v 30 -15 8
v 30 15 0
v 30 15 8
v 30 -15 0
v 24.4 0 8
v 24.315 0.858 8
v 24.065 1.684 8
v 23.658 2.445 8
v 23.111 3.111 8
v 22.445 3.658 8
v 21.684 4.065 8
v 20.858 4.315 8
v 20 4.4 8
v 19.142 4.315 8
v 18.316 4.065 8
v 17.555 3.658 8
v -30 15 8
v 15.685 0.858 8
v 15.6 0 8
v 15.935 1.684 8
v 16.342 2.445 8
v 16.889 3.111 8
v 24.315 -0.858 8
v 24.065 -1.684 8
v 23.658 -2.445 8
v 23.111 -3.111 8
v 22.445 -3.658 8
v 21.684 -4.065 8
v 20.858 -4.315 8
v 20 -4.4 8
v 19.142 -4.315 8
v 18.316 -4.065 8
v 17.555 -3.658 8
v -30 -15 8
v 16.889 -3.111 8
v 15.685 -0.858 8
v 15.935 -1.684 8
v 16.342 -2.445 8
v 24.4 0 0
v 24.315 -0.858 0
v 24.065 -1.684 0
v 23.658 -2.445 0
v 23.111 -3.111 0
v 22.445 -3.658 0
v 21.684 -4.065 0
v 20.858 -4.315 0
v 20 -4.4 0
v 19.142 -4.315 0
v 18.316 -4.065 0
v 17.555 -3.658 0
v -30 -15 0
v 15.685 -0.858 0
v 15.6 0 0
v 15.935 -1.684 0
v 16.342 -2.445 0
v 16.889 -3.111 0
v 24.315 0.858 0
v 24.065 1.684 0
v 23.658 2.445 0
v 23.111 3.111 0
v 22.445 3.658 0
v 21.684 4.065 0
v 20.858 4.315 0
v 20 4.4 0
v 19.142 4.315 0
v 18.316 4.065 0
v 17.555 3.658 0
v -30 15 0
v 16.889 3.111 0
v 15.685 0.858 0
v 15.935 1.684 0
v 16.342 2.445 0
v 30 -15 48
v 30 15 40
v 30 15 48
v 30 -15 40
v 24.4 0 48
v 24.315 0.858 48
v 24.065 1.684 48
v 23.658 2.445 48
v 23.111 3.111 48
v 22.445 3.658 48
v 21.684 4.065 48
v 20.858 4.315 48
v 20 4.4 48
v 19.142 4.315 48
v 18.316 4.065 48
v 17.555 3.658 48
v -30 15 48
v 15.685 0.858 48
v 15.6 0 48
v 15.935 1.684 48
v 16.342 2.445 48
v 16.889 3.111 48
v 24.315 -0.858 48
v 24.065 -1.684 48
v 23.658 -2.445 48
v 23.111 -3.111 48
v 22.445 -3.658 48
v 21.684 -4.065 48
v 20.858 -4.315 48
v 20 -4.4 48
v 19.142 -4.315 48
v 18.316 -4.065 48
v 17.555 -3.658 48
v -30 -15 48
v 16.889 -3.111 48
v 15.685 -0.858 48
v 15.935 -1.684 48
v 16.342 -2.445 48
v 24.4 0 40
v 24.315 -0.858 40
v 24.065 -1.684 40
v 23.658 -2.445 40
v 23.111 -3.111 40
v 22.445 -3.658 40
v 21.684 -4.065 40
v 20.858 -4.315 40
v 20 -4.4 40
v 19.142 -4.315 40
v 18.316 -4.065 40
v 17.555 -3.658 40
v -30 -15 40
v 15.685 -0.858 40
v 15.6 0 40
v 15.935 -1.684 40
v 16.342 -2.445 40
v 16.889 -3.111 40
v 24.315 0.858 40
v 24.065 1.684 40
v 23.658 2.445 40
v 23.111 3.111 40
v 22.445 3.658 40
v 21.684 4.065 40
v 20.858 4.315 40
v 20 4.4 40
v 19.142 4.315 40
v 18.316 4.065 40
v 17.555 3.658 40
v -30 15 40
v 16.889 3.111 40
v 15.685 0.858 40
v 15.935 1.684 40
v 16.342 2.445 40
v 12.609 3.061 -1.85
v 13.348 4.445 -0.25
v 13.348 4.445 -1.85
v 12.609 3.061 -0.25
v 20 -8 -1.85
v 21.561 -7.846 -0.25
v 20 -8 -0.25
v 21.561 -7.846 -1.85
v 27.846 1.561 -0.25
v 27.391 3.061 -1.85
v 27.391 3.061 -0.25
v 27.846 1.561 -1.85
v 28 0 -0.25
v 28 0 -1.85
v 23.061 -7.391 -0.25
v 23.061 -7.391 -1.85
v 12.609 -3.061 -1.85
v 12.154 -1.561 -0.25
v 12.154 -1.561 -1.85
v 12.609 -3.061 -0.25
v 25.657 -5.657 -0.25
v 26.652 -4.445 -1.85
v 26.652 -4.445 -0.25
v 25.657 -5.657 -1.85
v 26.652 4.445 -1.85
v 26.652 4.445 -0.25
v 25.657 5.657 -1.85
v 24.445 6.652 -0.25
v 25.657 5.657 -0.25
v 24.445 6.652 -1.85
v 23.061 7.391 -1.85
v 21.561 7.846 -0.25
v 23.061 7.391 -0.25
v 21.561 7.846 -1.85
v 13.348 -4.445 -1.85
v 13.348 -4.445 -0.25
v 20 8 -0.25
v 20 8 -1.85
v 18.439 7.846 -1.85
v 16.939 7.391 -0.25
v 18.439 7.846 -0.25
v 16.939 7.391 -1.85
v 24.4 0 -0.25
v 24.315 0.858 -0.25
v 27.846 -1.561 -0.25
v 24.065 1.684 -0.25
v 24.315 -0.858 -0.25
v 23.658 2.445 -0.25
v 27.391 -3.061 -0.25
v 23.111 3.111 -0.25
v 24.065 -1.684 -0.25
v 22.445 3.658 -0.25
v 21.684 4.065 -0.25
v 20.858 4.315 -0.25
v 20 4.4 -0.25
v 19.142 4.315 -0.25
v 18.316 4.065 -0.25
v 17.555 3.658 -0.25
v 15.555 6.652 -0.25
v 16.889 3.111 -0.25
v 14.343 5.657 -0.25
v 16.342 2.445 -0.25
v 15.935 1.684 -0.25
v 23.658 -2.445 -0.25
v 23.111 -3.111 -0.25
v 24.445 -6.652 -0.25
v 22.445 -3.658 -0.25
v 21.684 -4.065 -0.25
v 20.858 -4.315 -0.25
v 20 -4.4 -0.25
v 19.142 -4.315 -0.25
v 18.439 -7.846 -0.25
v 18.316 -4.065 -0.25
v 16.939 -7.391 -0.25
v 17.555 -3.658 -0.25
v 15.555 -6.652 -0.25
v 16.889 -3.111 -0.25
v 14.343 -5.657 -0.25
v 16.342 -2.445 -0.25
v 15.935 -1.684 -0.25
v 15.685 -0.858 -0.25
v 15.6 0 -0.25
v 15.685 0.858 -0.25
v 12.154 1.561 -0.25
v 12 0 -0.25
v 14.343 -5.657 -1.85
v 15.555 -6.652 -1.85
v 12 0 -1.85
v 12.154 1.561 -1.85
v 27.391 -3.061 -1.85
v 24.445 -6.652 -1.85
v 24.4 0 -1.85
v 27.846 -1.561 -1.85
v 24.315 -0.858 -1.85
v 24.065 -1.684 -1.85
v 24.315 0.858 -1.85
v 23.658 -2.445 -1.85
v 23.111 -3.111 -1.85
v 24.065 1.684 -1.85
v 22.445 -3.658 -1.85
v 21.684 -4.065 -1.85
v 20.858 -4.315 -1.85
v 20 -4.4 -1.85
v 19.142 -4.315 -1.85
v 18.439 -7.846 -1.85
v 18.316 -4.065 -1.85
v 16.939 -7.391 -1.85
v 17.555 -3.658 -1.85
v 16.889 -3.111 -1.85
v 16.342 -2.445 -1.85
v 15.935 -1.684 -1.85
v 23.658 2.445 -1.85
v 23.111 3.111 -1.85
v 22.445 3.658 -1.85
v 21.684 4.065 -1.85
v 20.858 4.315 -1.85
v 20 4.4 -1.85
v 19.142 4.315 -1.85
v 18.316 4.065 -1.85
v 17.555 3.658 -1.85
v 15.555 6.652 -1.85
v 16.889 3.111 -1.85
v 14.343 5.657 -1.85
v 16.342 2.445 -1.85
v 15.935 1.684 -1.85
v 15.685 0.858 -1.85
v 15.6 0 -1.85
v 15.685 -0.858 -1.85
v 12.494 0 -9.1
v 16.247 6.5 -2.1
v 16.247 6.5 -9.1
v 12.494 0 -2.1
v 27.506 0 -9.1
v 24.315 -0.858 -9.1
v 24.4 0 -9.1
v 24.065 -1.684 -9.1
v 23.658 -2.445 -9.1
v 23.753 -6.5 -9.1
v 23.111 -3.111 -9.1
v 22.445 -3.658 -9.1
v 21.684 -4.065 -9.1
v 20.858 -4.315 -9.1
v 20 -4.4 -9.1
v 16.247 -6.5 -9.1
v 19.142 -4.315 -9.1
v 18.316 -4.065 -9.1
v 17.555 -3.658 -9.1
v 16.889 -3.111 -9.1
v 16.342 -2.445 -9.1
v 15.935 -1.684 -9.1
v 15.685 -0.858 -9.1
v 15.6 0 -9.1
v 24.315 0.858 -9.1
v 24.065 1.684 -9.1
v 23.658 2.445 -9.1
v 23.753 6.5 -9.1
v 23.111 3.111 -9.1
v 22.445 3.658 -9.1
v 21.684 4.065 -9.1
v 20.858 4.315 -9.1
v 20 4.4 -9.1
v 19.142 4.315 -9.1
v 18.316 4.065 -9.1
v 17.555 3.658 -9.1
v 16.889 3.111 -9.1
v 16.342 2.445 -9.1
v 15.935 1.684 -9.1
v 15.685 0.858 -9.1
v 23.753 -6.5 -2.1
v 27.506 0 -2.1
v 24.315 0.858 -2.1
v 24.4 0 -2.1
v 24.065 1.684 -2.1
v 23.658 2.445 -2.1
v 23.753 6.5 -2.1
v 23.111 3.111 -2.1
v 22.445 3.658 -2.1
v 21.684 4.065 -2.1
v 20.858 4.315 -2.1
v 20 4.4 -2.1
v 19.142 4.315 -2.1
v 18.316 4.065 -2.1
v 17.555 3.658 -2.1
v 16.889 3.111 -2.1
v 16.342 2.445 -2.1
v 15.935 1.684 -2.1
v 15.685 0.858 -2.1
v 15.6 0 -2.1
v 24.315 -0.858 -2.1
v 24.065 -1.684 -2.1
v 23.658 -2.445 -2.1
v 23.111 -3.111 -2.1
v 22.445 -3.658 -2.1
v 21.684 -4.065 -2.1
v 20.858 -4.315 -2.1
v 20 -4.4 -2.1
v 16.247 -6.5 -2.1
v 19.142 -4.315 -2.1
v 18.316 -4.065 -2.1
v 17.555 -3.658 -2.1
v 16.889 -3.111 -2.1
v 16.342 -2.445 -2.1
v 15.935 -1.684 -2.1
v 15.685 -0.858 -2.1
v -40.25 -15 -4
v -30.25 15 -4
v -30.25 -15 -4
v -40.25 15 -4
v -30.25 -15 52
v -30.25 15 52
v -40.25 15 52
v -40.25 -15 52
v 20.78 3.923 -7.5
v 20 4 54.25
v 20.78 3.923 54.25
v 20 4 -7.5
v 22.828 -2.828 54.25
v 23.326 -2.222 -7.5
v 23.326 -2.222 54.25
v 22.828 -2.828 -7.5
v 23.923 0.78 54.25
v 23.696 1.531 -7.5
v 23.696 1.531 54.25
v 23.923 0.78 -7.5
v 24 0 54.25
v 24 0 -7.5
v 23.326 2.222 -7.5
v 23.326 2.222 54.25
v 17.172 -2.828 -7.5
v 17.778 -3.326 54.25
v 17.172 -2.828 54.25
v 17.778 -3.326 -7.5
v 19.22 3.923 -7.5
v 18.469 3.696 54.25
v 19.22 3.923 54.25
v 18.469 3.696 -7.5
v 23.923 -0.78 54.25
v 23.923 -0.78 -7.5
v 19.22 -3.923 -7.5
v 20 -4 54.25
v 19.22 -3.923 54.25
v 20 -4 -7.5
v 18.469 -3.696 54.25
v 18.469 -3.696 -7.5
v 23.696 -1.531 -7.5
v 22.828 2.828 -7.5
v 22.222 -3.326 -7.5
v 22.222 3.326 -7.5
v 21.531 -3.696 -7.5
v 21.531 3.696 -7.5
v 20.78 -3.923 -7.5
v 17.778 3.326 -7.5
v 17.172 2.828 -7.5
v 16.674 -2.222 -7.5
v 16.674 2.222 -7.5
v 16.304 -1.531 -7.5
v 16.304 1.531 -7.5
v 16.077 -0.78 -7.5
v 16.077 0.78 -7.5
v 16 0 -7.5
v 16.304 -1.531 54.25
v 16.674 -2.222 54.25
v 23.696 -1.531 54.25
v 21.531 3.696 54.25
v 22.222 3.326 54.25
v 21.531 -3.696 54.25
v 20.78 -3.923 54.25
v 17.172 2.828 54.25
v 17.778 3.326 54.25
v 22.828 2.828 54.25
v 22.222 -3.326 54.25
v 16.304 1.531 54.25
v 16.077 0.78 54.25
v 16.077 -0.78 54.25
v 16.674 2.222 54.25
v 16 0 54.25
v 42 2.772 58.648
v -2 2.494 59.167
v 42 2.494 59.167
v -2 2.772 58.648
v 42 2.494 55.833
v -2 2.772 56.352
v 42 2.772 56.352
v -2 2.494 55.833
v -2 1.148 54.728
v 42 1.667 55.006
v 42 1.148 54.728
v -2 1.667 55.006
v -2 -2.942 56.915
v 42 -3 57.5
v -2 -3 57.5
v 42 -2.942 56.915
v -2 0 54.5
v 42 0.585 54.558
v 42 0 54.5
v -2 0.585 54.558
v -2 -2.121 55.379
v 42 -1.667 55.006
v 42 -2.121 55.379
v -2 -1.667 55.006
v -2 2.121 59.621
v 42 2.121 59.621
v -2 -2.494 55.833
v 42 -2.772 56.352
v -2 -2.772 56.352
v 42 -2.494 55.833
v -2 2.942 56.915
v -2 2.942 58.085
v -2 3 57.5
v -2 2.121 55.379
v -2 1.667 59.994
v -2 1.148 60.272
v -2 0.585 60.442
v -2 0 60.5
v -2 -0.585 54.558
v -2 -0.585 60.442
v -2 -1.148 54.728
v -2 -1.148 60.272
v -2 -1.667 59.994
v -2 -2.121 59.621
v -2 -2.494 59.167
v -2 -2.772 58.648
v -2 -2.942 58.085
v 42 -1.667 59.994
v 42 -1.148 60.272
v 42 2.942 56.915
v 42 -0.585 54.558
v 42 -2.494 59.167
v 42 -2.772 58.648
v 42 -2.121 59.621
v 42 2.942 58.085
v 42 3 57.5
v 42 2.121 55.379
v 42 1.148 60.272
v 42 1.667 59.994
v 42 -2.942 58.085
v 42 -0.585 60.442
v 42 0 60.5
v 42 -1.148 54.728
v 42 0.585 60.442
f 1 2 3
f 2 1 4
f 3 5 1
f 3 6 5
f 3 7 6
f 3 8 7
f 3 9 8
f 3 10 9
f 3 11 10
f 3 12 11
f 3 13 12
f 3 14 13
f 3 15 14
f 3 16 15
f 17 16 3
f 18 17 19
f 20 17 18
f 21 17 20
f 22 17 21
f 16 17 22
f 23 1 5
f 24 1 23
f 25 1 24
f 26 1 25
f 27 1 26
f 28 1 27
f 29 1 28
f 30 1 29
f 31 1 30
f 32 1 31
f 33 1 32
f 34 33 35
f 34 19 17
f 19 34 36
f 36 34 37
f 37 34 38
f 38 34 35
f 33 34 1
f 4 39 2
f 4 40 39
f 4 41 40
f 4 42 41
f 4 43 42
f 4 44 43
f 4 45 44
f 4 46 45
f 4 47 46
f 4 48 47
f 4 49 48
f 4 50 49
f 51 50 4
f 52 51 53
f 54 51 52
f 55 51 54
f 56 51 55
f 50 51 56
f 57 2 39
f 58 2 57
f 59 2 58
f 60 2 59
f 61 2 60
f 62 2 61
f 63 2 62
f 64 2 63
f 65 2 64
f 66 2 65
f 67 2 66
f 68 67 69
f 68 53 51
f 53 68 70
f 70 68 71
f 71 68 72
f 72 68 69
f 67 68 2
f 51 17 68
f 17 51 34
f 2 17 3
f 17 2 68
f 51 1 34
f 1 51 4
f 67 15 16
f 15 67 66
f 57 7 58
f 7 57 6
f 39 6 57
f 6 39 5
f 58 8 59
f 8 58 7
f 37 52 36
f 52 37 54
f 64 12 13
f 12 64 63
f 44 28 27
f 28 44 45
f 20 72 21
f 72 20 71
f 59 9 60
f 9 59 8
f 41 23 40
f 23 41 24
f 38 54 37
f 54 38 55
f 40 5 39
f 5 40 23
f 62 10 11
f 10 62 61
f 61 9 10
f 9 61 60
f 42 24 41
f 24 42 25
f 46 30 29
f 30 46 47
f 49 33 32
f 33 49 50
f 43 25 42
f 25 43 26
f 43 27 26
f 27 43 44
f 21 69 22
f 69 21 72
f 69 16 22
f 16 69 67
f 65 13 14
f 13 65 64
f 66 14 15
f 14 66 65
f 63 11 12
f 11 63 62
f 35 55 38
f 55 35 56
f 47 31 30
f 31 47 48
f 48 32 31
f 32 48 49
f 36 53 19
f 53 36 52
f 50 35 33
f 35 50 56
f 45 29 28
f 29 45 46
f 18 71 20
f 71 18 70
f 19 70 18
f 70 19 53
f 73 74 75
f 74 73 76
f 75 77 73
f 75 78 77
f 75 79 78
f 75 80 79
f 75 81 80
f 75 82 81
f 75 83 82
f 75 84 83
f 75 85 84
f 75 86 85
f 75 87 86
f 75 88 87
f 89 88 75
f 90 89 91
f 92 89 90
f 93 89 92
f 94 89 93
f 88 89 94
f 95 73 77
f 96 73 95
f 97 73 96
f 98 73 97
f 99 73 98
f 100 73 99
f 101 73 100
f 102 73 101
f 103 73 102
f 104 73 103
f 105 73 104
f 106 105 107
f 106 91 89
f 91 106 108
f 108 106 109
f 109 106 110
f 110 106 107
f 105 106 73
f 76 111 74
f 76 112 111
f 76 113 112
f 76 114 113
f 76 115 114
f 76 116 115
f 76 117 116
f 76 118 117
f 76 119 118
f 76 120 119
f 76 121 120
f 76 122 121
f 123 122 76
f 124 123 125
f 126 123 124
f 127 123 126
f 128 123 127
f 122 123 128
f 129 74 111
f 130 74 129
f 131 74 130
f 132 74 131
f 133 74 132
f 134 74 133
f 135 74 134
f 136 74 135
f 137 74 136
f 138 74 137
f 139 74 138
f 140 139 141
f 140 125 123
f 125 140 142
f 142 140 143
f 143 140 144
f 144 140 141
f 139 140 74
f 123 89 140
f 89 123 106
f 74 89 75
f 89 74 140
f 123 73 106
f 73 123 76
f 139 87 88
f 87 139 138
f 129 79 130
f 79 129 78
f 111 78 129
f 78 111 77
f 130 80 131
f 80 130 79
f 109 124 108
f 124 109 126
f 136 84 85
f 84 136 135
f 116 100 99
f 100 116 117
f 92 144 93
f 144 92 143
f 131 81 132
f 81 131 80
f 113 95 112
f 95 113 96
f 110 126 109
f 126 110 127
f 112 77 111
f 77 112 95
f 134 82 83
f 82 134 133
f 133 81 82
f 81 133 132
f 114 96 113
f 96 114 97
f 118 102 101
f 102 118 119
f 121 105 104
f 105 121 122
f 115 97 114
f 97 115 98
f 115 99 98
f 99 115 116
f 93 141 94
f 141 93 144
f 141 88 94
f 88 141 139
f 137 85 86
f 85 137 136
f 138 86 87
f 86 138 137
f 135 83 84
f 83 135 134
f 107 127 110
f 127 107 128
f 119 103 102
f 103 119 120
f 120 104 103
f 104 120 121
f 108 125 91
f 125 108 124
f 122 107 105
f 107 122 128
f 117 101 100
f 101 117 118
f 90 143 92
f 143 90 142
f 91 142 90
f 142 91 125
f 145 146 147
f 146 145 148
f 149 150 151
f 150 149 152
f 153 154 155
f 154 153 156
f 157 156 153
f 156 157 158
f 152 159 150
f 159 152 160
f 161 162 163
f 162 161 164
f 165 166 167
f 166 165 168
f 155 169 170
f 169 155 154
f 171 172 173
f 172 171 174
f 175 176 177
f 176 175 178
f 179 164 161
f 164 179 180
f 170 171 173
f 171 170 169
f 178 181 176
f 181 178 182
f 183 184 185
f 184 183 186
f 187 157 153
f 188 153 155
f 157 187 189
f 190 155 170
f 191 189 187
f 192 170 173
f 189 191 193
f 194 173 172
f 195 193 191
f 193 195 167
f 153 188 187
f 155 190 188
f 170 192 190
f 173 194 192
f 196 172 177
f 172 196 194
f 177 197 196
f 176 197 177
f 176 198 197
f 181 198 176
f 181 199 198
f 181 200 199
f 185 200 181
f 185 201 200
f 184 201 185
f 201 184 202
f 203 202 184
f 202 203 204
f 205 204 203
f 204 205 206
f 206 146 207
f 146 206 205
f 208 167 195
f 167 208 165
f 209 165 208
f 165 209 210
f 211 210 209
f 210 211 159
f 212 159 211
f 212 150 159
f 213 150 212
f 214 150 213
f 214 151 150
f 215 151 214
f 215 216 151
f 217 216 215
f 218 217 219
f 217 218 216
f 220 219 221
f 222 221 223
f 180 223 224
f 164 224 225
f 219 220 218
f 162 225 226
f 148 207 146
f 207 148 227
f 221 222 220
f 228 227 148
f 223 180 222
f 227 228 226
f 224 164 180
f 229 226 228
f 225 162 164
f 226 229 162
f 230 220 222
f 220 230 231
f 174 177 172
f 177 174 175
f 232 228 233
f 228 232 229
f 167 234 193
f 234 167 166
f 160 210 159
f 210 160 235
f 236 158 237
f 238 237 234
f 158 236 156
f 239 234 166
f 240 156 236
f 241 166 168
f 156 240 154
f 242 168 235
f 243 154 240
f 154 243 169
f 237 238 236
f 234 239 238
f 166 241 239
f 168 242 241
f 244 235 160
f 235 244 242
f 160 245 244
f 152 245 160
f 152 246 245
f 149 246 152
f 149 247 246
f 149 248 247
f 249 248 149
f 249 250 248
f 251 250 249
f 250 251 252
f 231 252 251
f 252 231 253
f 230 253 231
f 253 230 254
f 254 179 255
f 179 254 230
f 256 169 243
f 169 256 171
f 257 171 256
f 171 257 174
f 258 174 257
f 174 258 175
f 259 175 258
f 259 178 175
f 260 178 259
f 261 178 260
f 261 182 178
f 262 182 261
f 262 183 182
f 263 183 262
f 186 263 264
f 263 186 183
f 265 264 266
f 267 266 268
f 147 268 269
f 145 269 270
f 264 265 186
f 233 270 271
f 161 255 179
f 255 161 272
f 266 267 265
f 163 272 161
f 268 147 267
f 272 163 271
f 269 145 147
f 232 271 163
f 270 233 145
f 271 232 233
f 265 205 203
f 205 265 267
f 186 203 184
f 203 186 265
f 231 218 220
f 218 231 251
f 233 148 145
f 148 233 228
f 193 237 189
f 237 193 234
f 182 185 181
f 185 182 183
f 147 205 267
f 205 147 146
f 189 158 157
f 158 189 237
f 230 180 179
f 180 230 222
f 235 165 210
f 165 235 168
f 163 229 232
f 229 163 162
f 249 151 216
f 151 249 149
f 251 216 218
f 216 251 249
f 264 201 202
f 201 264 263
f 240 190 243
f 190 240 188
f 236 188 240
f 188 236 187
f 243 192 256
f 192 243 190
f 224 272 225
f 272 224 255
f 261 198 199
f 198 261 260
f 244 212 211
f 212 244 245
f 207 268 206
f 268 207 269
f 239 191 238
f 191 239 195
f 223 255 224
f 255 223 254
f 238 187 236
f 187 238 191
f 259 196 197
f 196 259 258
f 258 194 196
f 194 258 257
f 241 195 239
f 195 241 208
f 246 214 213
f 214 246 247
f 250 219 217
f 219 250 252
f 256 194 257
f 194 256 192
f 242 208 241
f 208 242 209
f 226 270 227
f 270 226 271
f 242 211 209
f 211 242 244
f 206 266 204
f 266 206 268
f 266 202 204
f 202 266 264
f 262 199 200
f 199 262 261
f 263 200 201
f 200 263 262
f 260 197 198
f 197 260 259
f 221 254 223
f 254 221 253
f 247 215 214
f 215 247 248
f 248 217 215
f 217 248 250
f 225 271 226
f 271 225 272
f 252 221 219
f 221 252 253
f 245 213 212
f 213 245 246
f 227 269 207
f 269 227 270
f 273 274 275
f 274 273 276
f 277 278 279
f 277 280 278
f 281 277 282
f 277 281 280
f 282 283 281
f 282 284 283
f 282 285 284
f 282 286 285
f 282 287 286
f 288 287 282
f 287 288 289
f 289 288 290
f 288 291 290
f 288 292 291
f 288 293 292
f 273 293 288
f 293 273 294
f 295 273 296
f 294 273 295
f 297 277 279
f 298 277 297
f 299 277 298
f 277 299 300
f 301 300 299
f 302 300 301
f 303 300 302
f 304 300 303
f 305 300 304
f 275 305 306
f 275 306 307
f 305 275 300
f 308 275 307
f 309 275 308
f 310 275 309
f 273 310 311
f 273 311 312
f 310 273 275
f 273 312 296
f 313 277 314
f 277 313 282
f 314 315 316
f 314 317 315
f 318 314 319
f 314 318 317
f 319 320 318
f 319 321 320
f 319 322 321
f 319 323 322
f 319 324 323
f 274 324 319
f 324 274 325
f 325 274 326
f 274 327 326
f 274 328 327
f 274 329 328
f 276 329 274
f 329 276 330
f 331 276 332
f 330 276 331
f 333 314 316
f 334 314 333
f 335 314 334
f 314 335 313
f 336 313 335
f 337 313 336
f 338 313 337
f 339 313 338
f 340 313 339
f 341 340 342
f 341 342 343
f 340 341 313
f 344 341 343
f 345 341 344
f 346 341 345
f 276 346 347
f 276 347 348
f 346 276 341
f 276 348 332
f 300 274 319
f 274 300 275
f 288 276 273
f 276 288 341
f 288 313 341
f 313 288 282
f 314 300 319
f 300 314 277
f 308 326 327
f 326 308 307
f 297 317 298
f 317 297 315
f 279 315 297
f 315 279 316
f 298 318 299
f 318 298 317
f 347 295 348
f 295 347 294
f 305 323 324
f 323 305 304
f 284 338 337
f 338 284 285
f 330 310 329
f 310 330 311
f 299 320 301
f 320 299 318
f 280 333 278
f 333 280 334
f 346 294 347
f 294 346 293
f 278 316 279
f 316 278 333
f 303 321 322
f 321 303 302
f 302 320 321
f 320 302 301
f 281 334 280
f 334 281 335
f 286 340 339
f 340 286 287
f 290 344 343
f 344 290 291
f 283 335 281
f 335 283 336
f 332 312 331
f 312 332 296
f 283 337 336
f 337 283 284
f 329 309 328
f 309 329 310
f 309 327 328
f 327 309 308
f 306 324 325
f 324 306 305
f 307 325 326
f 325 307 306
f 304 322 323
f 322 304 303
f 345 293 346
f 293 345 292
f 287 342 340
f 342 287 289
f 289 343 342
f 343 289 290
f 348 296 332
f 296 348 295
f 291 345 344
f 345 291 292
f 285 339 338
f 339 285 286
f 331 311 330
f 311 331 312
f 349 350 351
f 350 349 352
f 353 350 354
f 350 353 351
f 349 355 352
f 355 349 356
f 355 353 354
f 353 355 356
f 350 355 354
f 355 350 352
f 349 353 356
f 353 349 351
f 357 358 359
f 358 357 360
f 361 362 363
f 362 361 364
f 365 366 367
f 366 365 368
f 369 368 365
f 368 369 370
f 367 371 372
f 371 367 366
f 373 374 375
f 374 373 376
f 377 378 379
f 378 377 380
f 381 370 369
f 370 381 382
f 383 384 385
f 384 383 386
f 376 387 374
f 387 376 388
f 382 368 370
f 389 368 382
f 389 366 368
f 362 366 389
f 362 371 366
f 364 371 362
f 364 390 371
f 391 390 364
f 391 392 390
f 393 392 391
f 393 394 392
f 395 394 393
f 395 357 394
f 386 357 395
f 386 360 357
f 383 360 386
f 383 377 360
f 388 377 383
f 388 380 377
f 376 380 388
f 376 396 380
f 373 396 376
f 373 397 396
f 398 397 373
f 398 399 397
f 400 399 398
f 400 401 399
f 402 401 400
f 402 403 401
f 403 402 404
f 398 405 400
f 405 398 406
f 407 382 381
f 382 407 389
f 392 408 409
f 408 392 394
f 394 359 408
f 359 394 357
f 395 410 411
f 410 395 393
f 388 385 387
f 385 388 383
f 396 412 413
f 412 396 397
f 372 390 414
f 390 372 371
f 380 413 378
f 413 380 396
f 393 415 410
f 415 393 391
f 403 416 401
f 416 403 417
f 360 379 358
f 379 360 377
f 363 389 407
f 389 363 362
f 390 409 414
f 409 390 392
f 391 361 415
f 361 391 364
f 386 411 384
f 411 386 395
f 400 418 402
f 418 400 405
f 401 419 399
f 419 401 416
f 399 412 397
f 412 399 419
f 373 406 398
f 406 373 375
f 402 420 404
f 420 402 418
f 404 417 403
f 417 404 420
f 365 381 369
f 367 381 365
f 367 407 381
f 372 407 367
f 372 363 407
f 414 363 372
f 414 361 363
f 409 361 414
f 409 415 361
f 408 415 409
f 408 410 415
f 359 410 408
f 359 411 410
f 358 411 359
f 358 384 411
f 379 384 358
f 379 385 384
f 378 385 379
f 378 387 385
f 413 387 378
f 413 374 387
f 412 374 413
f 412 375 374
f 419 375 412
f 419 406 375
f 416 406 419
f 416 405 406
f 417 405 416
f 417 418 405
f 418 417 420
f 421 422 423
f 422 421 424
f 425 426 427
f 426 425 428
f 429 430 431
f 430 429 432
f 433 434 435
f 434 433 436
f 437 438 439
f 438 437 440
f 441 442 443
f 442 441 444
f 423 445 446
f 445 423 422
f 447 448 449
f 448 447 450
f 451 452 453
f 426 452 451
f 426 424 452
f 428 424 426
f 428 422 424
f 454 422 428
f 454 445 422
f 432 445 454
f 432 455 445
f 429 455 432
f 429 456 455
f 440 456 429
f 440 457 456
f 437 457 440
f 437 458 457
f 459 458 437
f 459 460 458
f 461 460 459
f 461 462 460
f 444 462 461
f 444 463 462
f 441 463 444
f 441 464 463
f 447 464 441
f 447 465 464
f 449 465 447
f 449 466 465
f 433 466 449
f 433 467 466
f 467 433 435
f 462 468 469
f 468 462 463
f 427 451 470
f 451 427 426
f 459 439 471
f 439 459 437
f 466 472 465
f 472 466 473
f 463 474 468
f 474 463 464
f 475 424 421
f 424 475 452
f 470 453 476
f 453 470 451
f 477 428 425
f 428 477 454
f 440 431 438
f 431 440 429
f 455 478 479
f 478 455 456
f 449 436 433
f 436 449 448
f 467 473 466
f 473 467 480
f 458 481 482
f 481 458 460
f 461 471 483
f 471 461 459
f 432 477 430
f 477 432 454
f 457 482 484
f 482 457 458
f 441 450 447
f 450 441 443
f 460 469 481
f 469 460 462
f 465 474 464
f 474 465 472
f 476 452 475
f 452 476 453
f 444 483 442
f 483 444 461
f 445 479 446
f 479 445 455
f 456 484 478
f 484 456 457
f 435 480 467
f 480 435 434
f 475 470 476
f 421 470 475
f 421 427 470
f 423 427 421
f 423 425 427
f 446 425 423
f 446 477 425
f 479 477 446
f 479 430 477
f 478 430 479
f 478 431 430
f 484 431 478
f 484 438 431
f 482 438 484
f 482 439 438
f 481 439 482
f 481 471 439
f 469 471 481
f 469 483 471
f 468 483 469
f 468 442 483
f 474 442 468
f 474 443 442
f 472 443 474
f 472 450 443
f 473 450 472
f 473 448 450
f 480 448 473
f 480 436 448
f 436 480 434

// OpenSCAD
$fn = 32;

// ------------------------------------------------------------------------
// C clamp: throat 40 mm, screw d8
// Every part is its own module, assembly() places every instance.
// ------------------------------------------------------------------------

// --- part 1 ---
module clamp_arm() {
  difference() {
    translate([-30, -15, 0]) cube([60, 30, 8]);
    translate([20, 0, -1]) cylinder(h = 10, d = 8.8);
  }
}

// --- part 2 ---
module clamp_spine() {
  difference() {
    translate([-28, -15, 0]) cube([56, 30, 10]);
  }
}

// --- part 3 ---
module clamp_screw() {
  translate([0, 0, -30.875]) cylinder(h = 61.75, d = 8);
}

// --- part 4 ---
module clamp_washer() {
  difference() {
      translate([0, 0, 0]) cylinder(h = 1.6, d = 16);
      translate([0, 0, -1]) cylinder(h = 3.6, d = 8.8);
    }
}

// --- part 5 ---
module clamp_nut() {
  difference() {
    linear_extrude(height = 7) polygon(points = [[7.506, 0], [3.753, 6.5], [-3.753, 6.5], [-7.506, 0], [-3.753, -6.5], [3.753, -6.5]]);
    translate([0, 0, -1]) cylinder(h = 9, d = 8.8);
  }
}

// --- part 6 ---
module tommy_bar() {
  translate([0, 0, -22]) cylinder(h = 44, d = 6);
}

// --- assembly ---
module assembly() {
  color([0.80, 0.24, 0.20]) translate([0, 0, 0]) rotate([0, 0, 0]) clamp_arm();
  color([0.20, 0.45, 0.75]) translate([0, 0, 40]) rotate([0, 0, 0]) clamp_arm();
  color([0.25, 0.62, 0.32]) translate([-40.25, 0, 24]) rotate([0, 90, 0]) clamp_spine();
  color([0.92, 0.70, 0.18]) translate([20, 0, 23.375]) rotate([0, 0, 0]) clamp_screw();
  color([0.58, 0.35, 0.70]) translate([20, 0, -1.85]) rotate([0, 0, 0]) clamp_washer();
  color([0.16, 0.66, 0.66]) translate([20, 0, -9.1]) rotate([0, 0, 0]) clamp_nut();
  color([0.85, 0.48, 0.18]) translate([20, 0, 57.5]) rotate([0, 90, 0]) tommy_bar();
}

assembly();
